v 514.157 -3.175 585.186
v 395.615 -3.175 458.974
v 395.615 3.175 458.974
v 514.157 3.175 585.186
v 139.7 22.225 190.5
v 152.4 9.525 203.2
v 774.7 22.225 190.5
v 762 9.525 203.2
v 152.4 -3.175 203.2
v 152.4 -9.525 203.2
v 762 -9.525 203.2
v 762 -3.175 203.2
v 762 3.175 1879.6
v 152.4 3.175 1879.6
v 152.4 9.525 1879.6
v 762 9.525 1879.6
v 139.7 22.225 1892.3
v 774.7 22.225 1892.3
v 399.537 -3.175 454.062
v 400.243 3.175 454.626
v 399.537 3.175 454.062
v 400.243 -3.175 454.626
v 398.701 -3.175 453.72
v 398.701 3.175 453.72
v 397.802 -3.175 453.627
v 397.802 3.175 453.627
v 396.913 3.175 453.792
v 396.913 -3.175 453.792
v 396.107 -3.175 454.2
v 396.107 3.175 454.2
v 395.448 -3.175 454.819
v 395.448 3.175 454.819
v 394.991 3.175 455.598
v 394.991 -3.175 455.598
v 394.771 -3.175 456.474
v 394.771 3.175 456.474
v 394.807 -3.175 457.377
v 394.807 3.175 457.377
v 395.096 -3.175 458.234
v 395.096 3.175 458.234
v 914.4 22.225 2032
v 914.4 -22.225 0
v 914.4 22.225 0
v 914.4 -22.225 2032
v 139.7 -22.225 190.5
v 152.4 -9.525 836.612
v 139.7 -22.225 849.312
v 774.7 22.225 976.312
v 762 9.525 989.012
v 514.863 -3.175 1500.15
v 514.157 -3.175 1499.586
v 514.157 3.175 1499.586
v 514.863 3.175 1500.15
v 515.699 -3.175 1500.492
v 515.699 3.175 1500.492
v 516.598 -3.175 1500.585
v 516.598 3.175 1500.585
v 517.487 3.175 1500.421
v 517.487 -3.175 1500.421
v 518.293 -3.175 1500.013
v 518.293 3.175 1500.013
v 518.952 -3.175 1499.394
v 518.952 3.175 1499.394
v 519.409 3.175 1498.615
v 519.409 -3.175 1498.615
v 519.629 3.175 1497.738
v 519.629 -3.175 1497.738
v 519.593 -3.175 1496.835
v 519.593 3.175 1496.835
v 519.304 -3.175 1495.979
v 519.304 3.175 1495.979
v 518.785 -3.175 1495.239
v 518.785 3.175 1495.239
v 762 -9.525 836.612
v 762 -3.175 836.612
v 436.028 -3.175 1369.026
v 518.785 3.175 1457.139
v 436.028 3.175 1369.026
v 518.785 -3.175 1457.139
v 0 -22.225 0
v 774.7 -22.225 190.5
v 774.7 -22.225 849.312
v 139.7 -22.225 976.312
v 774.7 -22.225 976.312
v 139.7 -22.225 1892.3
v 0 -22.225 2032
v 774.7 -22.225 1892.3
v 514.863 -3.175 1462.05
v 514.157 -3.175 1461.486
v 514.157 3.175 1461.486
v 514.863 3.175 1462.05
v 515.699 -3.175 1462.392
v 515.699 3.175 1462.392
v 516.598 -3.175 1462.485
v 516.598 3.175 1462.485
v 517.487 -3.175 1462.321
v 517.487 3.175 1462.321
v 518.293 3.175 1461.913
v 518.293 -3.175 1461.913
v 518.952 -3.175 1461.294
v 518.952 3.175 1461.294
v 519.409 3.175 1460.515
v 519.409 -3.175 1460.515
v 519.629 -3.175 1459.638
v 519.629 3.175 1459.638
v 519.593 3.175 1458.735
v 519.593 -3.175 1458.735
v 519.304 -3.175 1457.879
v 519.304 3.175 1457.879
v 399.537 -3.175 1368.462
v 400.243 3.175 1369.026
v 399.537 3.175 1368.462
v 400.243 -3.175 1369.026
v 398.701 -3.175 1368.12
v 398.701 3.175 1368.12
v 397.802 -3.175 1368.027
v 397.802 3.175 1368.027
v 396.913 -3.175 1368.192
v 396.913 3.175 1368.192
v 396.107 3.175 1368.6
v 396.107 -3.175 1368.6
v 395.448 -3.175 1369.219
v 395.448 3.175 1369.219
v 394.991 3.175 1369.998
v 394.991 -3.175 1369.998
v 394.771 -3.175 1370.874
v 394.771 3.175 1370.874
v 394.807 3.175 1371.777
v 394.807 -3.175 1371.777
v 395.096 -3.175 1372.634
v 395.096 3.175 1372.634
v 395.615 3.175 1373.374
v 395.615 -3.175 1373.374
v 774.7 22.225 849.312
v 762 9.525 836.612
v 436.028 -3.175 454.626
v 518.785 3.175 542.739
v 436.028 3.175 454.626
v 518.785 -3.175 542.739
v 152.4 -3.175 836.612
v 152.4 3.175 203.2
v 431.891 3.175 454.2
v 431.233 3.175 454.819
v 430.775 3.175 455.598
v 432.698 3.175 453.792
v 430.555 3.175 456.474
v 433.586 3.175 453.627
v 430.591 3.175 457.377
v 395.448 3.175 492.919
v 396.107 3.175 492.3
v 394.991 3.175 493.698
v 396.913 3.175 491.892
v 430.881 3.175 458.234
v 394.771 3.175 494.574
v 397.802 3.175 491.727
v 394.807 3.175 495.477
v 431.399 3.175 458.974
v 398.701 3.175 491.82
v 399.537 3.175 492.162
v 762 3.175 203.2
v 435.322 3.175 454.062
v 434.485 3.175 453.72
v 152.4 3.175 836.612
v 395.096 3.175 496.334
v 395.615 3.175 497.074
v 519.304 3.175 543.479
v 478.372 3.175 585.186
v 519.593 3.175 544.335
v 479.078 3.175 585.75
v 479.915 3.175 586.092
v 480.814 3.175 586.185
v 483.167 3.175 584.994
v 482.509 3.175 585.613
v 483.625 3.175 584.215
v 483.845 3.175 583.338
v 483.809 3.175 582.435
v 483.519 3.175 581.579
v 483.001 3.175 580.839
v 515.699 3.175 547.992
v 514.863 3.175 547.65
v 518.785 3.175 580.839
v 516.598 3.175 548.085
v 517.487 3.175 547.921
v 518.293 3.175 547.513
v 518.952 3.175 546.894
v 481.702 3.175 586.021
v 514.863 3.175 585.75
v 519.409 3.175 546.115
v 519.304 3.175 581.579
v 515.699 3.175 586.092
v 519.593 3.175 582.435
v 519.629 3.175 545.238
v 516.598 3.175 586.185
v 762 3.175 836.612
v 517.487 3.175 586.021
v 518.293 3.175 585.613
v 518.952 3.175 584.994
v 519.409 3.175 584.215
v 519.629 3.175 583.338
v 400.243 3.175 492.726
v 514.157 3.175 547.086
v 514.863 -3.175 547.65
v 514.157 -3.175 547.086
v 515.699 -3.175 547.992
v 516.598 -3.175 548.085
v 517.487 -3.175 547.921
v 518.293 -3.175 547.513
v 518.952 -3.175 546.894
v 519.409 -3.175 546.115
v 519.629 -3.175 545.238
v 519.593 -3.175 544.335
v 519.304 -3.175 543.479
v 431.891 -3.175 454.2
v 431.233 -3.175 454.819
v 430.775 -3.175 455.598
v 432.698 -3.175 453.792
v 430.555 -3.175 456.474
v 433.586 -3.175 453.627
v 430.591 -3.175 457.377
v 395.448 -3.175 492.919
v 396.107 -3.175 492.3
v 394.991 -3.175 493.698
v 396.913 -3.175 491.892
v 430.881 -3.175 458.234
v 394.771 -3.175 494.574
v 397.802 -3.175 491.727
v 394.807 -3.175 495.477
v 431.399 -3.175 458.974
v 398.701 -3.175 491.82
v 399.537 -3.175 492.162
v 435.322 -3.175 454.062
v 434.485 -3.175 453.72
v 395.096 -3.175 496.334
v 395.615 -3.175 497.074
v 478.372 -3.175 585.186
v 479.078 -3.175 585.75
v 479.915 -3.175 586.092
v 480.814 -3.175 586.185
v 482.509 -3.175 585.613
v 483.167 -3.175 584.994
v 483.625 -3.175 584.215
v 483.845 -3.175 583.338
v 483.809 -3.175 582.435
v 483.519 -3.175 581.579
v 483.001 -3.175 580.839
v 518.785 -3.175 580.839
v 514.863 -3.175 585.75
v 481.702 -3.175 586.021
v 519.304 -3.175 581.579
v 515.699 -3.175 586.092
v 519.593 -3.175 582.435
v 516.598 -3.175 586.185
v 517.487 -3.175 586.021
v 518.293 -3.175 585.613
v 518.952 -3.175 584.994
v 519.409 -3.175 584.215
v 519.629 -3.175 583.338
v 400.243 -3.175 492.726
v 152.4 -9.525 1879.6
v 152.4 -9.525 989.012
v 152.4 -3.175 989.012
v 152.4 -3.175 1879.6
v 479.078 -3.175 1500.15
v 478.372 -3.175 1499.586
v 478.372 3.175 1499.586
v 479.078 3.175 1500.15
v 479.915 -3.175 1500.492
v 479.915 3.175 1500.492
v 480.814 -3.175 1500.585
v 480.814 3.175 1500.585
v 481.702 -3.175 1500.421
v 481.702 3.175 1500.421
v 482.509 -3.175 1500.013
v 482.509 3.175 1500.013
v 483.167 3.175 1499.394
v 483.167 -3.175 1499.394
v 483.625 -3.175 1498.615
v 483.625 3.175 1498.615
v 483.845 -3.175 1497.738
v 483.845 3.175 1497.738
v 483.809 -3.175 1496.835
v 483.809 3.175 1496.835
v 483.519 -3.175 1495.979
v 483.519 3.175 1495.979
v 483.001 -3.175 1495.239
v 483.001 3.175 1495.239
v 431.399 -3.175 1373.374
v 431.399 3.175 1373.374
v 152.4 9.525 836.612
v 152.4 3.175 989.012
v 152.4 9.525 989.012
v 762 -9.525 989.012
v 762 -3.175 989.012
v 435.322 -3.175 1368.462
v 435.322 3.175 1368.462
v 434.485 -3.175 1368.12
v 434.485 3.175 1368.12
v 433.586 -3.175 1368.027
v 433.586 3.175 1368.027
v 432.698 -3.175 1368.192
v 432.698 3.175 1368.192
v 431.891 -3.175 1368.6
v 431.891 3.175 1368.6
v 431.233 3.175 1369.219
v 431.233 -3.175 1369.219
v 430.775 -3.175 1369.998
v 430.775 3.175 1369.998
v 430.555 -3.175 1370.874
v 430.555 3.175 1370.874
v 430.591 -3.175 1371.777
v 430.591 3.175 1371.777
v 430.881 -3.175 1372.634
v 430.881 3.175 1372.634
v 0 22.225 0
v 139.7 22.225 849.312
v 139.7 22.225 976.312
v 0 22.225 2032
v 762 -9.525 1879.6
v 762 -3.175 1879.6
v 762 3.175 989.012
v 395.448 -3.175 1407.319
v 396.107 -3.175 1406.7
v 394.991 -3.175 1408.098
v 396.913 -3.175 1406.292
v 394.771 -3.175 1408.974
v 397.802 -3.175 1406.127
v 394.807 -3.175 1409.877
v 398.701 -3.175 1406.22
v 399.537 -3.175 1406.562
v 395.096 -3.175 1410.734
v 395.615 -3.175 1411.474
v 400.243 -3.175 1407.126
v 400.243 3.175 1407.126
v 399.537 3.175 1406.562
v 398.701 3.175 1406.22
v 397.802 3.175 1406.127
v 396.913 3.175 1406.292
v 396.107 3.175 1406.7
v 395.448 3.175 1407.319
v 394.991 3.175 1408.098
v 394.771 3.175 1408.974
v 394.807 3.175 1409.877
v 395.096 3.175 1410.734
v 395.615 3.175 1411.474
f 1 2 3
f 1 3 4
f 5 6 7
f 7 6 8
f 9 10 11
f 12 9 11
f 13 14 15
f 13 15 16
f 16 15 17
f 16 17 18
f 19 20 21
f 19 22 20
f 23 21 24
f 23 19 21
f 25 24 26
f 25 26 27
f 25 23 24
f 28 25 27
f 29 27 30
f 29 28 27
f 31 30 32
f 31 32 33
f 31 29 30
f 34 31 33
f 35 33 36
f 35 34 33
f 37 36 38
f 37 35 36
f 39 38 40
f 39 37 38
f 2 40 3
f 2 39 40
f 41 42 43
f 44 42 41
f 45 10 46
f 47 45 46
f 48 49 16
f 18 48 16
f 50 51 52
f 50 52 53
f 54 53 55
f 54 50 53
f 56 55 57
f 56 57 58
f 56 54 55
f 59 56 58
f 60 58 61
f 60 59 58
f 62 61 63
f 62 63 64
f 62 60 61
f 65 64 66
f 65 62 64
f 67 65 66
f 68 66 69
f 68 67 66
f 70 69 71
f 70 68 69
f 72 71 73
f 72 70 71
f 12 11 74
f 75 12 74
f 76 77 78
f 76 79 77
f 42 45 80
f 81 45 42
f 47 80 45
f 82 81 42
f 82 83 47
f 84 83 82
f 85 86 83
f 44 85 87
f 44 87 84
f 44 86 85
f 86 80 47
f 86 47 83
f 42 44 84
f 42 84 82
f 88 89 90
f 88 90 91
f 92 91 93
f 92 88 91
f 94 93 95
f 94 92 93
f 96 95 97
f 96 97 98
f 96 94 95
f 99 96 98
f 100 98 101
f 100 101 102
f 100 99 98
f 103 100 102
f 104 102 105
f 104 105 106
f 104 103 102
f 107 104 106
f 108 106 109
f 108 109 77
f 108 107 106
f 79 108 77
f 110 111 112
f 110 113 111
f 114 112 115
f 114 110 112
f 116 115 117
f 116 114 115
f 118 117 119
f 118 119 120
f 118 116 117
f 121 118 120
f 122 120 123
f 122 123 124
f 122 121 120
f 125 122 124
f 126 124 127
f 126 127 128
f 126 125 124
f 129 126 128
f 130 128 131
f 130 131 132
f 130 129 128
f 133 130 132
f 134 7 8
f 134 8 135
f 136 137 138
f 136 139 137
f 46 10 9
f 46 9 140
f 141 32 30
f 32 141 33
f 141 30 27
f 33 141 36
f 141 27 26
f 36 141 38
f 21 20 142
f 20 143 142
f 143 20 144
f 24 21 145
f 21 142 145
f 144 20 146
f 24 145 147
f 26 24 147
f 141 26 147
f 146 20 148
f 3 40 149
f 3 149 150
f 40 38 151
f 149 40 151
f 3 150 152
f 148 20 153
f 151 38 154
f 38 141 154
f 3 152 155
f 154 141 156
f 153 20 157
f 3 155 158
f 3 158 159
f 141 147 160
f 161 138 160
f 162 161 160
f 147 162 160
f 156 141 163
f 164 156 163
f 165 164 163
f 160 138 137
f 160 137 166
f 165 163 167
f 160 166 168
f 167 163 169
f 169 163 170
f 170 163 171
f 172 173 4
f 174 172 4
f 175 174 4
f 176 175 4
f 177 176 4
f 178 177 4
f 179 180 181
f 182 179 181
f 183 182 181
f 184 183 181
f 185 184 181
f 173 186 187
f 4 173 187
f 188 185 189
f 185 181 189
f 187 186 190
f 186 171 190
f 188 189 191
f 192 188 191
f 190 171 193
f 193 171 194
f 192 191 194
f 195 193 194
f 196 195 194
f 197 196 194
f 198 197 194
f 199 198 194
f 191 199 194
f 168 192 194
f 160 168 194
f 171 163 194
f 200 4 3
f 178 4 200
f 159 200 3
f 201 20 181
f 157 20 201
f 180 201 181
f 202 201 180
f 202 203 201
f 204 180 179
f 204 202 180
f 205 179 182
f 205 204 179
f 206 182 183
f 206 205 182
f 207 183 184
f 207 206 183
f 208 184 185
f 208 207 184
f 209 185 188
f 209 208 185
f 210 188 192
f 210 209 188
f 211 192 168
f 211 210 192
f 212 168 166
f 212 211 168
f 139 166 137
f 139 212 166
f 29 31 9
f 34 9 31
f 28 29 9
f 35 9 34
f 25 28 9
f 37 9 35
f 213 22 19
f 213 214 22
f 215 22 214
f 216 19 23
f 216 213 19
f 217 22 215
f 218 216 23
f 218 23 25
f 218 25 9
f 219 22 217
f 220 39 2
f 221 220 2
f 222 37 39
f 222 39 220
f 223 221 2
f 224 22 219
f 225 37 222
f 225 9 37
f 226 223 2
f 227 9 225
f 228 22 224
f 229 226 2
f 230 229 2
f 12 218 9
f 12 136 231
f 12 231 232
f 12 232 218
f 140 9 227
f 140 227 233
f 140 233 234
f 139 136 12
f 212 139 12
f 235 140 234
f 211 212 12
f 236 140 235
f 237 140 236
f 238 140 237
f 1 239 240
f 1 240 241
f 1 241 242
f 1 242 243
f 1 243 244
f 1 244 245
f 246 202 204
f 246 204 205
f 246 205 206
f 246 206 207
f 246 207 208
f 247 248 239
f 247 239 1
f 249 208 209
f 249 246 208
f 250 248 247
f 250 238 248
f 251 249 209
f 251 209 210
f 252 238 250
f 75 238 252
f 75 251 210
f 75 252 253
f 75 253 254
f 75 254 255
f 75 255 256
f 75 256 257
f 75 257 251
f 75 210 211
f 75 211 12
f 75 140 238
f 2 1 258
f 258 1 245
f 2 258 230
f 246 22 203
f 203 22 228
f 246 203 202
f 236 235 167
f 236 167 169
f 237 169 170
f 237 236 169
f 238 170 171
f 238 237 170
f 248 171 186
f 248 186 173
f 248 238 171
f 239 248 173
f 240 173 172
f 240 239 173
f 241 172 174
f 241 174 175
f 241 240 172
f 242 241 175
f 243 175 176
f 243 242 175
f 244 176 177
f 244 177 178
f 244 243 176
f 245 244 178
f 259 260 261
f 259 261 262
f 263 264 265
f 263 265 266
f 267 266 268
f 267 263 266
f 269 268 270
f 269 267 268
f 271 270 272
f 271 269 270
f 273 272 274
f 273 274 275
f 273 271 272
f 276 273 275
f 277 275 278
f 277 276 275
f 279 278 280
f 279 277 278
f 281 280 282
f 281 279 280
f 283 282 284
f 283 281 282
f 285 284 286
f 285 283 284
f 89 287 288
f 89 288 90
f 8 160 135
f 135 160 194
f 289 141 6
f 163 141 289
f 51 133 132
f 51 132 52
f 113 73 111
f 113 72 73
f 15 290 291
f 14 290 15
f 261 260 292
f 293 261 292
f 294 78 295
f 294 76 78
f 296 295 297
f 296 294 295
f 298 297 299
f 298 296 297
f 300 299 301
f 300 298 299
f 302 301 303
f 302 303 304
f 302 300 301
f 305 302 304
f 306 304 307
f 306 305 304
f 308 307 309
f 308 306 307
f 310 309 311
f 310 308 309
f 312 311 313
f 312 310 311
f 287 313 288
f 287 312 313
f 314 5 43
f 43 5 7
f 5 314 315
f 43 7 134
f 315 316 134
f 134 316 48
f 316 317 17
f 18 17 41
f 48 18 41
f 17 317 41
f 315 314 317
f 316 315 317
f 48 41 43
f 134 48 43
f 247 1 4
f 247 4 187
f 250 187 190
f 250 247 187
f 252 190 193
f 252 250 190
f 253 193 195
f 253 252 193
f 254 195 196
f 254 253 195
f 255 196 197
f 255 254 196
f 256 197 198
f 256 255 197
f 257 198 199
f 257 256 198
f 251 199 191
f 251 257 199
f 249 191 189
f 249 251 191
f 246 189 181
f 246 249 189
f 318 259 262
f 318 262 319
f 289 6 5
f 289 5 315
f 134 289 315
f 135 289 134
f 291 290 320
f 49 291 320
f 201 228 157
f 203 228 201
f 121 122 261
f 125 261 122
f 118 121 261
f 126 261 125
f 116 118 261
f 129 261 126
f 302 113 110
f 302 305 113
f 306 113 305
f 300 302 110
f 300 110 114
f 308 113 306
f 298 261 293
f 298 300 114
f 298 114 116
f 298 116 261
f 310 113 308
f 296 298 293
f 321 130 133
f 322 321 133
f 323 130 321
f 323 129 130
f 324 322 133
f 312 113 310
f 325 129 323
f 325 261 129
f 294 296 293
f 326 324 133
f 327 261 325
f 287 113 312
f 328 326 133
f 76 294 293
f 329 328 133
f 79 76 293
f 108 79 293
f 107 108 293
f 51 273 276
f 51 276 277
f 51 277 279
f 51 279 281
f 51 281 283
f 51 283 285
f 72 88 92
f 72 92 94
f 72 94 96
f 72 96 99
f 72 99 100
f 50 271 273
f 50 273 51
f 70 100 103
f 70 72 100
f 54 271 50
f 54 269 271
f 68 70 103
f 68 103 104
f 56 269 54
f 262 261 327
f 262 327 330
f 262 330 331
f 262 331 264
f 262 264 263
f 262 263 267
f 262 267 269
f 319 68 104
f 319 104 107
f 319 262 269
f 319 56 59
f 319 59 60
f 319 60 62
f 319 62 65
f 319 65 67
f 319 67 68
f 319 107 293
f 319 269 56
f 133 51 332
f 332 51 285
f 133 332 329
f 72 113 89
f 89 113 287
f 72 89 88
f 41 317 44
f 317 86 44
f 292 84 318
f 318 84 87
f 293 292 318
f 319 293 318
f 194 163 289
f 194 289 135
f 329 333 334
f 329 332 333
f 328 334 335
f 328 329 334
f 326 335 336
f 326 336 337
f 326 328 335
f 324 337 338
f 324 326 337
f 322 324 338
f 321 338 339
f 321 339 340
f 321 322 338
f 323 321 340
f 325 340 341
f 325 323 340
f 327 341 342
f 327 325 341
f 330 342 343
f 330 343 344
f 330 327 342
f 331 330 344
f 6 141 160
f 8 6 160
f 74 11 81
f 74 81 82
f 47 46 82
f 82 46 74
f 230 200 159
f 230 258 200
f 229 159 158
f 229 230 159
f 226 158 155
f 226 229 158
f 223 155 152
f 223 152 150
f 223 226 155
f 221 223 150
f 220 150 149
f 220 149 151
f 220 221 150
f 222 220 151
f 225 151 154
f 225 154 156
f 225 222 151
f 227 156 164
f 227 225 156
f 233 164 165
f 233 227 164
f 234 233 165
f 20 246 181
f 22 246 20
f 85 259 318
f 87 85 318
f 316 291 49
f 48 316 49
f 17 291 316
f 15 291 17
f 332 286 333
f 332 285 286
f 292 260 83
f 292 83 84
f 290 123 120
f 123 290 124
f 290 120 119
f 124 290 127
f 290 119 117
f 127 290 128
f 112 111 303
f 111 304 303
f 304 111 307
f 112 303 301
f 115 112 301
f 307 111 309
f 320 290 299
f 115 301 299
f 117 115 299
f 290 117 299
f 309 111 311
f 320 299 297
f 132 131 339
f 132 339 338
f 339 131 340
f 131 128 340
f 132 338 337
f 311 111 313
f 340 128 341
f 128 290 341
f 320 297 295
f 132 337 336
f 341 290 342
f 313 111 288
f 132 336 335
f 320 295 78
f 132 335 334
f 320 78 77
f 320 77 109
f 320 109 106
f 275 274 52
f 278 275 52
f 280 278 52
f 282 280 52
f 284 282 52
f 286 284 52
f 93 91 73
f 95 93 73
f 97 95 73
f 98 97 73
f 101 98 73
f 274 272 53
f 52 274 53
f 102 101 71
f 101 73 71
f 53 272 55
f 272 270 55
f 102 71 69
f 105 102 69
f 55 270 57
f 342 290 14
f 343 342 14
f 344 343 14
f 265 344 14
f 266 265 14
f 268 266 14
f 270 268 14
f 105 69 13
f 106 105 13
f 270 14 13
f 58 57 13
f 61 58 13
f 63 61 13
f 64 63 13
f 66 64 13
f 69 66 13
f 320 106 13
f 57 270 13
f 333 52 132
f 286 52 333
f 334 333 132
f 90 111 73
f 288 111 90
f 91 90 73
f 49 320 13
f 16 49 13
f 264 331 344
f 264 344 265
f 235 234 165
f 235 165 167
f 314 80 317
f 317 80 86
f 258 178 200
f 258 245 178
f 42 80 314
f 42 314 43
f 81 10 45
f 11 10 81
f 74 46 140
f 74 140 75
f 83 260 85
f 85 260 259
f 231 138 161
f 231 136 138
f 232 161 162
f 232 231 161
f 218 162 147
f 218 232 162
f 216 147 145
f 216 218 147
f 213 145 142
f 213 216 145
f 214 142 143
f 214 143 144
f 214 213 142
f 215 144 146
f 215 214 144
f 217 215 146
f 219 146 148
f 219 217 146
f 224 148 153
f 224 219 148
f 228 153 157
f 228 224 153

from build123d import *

# Parameters (mm, degrees)
F0_W          = 914.4
F0_H          = 2032
F0_W_2        = 609.6
F0_H_2        = 633.4125
F0_H_3        = 890.5875
F1_DEPTH      = 22.225
F1_DEPTH_BACK = 22.225
F2_W          = 609.6
F2_H          = 890.5875
F2_H_2        = 633.4125
F3_DEPTH      = 3.175
F3_DEPTH_BACK = 3.175
F4_SIZE       = 12.7


# Not quite as in the source:
# - a length typed as a fraction of an inch, garbled in the dataset ("3 / 203.2 mm" for 3/8 in), is restored


with BuildPart() as f1:
    # F0 (on Front) → F1 (new body, two sides)
    with BuildSketch(Plane.XZ) as f1_sk:
        with Locations((457.2, 1016)):
            Rectangle(F0_W, F0_H)
        with Locations((457.2, 519.90625)):
            Rectangle(F0_W_2, F0_H_2, mode=Mode.SUBTRACT)
        with Locations((457.2, 1434.30625)):
            Rectangle(F0_W_2, F0_H_3, mode=Mode.SUBTRACT)
    extrude(amount=F1_DEPTH)
    extrude(f1_sk.sketch, amount=-F1_DEPTH_BACK)

    # F2 (on Front) → F3 (join, two sides)
    with BuildSketch(Plane.XZ) as f3_sk:
        with Locations((457.2, 1434.30625)):
            Rectangle(F2_W, F2_H)
        with BuildLine():
            Line((395.6148101771, 1373.3735846555), (514.1566101771, 1499.5861846555))
            ThreePointArc((514.1566101771, 1499.5861846555), (518.6445346555, 1499.7268398229), (518.7851898229, 1495.2389153445))
            Line((518.7851898229, 1495.2389153445), (400.2433898229, 1369.0263153445))
            ThreePointArc((400.2433898229, 1369.0263153445), (395.7554653445, 1368.8856601771), (395.6148101771, 1373.3735846555))
        make_face(mode=Mode.SUBTRACT)
        with BuildLine():
            Line((395.6148101771, 1411.4735846555), (478.3722068767, 1499.5861846555))
            ThreePointArc((478.3722068767, 1499.5861846555), (482.8601313551, 1499.7268398229), (483.0007865224, 1495.2389153445))
            Line((483.0007865224, 1495.2389153445), (400.2433898229, 1407.1263153445))
            ThreePointArc((400.2433898229, 1407.1263153445), (395.7554653445, 1406.9856601771), (395.6148101771, 1411.4735846555))
        make_face(mode=Mode.SUBTRACT)
        with BuildLine():
            Line((431.3992134776, 1373.3735846555), (514.1566101771, 1461.4861846555))
            ThreePointArc((514.1566101771, 1461.4861846555), (518.6445346555, 1461.6268398229), (518.7851898229, 1457.1389153445))
            Line((518.7851898229, 1457.1389153445), (436.0277931233, 1369.0263153445))
            ThreePointArc((436.0277931233, 1369.0263153445), (431.5398686449, 1368.8856601771), (431.3992134776, 1373.3735846555))
        make_face(mode=Mode.SUBTRACT)
        with Locations((457.2, 519.90625)):
            Rectangle(F2_W, F2_H_2)
        with BuildLine():
            Line((395.6148101771, 497.0735846555), (478.3722068767, 585.1861846555))
            ThreePointArc((478.3722068767, 585.1861846555), (482.8601313551, 585.3268398229), (483.0007865224, 580.8389153445))
            Line((483.0007865224, 580.8389153445), (400.2433898229, 492.7263153445))
            ThreePointArc((400.2433898229, 492.7263153445), (395.7554653445, 492.5856601771), (395.6148101771, 497.0735846555))
        make_face(mode=Mode.SUBTRACT)
        with BuildLine():
            Line((395.6148101771, 458.9735846555), (514.1566101771, 585.1861846555))
            ThreePointArc((514.1566101771, 585.1861846555), (518.6445346555, 585.3268398229), (518.7851898229, 580.8389153445))
            Line((518.7851898229, 580.8389153445), (400.2433898229, 454.6263153445))
            ThreePointArc((400.2433898229, 454.6263153445), (395.7554653445, 454.4856601771), (395.6148101771, 458.9735846555))
        make_face(mode=Mode.SUBTRACT)
        with BuildLine():
            Line((431.3992134776, 458.9735846555), (514.1566101771, 547.0861846555))
            ThreePointArc((514.1566101771, 547.0861846555), (518.6445346555, 547.2268398229), (518.7851898229, 542.7389153445))
            Line((518.7851898229, 542.7389153445), (436.0277931233, 454.6263153445))
            ThreePointArc((436.0277931233, 454.6263153445), (431.5398686449, 454.4856601771), (431.3992134776, 458.9735846555))
        make_face(mode=Mode.SUBTRACT)
    extrude(amount=F3_DEPTH)
    extrude(f3_sk.sketch, amount=-F3_DEPTH_BACK)

    # F4
    f4_edges = [f1.edges().sort_by_distance(p)[0] for p in [
        (457.2, -22.225, 1879.6),
        (762, -22.225, 1434.30625),
        (457.2, -22.225, 989.0125),
        (152.4, -22.225, 1434.30625),
        (457.2, -22.225, 836.6125),
        (152.4, -22.225, 519.90625),
        (762, -22.225, 519.90625),
        (457.2, -22.225, 203.2),
        (457.2, 22.225, 836.6125),
        (762, 22.225, 519.90625),
        (152.4, 22.225, 519.90625),
        (457.2, 22.225, 203.2),
        (152.4, 22.225, 1434.30625),
        (457.2, 22.225, 989.0125),
        (762, 22.225, 1434.30625),
        (457.2, 22.225, 1879.6),
    ]]
    chamfer(f4_edges, length=F4_SIZE)


solid = f1.part
